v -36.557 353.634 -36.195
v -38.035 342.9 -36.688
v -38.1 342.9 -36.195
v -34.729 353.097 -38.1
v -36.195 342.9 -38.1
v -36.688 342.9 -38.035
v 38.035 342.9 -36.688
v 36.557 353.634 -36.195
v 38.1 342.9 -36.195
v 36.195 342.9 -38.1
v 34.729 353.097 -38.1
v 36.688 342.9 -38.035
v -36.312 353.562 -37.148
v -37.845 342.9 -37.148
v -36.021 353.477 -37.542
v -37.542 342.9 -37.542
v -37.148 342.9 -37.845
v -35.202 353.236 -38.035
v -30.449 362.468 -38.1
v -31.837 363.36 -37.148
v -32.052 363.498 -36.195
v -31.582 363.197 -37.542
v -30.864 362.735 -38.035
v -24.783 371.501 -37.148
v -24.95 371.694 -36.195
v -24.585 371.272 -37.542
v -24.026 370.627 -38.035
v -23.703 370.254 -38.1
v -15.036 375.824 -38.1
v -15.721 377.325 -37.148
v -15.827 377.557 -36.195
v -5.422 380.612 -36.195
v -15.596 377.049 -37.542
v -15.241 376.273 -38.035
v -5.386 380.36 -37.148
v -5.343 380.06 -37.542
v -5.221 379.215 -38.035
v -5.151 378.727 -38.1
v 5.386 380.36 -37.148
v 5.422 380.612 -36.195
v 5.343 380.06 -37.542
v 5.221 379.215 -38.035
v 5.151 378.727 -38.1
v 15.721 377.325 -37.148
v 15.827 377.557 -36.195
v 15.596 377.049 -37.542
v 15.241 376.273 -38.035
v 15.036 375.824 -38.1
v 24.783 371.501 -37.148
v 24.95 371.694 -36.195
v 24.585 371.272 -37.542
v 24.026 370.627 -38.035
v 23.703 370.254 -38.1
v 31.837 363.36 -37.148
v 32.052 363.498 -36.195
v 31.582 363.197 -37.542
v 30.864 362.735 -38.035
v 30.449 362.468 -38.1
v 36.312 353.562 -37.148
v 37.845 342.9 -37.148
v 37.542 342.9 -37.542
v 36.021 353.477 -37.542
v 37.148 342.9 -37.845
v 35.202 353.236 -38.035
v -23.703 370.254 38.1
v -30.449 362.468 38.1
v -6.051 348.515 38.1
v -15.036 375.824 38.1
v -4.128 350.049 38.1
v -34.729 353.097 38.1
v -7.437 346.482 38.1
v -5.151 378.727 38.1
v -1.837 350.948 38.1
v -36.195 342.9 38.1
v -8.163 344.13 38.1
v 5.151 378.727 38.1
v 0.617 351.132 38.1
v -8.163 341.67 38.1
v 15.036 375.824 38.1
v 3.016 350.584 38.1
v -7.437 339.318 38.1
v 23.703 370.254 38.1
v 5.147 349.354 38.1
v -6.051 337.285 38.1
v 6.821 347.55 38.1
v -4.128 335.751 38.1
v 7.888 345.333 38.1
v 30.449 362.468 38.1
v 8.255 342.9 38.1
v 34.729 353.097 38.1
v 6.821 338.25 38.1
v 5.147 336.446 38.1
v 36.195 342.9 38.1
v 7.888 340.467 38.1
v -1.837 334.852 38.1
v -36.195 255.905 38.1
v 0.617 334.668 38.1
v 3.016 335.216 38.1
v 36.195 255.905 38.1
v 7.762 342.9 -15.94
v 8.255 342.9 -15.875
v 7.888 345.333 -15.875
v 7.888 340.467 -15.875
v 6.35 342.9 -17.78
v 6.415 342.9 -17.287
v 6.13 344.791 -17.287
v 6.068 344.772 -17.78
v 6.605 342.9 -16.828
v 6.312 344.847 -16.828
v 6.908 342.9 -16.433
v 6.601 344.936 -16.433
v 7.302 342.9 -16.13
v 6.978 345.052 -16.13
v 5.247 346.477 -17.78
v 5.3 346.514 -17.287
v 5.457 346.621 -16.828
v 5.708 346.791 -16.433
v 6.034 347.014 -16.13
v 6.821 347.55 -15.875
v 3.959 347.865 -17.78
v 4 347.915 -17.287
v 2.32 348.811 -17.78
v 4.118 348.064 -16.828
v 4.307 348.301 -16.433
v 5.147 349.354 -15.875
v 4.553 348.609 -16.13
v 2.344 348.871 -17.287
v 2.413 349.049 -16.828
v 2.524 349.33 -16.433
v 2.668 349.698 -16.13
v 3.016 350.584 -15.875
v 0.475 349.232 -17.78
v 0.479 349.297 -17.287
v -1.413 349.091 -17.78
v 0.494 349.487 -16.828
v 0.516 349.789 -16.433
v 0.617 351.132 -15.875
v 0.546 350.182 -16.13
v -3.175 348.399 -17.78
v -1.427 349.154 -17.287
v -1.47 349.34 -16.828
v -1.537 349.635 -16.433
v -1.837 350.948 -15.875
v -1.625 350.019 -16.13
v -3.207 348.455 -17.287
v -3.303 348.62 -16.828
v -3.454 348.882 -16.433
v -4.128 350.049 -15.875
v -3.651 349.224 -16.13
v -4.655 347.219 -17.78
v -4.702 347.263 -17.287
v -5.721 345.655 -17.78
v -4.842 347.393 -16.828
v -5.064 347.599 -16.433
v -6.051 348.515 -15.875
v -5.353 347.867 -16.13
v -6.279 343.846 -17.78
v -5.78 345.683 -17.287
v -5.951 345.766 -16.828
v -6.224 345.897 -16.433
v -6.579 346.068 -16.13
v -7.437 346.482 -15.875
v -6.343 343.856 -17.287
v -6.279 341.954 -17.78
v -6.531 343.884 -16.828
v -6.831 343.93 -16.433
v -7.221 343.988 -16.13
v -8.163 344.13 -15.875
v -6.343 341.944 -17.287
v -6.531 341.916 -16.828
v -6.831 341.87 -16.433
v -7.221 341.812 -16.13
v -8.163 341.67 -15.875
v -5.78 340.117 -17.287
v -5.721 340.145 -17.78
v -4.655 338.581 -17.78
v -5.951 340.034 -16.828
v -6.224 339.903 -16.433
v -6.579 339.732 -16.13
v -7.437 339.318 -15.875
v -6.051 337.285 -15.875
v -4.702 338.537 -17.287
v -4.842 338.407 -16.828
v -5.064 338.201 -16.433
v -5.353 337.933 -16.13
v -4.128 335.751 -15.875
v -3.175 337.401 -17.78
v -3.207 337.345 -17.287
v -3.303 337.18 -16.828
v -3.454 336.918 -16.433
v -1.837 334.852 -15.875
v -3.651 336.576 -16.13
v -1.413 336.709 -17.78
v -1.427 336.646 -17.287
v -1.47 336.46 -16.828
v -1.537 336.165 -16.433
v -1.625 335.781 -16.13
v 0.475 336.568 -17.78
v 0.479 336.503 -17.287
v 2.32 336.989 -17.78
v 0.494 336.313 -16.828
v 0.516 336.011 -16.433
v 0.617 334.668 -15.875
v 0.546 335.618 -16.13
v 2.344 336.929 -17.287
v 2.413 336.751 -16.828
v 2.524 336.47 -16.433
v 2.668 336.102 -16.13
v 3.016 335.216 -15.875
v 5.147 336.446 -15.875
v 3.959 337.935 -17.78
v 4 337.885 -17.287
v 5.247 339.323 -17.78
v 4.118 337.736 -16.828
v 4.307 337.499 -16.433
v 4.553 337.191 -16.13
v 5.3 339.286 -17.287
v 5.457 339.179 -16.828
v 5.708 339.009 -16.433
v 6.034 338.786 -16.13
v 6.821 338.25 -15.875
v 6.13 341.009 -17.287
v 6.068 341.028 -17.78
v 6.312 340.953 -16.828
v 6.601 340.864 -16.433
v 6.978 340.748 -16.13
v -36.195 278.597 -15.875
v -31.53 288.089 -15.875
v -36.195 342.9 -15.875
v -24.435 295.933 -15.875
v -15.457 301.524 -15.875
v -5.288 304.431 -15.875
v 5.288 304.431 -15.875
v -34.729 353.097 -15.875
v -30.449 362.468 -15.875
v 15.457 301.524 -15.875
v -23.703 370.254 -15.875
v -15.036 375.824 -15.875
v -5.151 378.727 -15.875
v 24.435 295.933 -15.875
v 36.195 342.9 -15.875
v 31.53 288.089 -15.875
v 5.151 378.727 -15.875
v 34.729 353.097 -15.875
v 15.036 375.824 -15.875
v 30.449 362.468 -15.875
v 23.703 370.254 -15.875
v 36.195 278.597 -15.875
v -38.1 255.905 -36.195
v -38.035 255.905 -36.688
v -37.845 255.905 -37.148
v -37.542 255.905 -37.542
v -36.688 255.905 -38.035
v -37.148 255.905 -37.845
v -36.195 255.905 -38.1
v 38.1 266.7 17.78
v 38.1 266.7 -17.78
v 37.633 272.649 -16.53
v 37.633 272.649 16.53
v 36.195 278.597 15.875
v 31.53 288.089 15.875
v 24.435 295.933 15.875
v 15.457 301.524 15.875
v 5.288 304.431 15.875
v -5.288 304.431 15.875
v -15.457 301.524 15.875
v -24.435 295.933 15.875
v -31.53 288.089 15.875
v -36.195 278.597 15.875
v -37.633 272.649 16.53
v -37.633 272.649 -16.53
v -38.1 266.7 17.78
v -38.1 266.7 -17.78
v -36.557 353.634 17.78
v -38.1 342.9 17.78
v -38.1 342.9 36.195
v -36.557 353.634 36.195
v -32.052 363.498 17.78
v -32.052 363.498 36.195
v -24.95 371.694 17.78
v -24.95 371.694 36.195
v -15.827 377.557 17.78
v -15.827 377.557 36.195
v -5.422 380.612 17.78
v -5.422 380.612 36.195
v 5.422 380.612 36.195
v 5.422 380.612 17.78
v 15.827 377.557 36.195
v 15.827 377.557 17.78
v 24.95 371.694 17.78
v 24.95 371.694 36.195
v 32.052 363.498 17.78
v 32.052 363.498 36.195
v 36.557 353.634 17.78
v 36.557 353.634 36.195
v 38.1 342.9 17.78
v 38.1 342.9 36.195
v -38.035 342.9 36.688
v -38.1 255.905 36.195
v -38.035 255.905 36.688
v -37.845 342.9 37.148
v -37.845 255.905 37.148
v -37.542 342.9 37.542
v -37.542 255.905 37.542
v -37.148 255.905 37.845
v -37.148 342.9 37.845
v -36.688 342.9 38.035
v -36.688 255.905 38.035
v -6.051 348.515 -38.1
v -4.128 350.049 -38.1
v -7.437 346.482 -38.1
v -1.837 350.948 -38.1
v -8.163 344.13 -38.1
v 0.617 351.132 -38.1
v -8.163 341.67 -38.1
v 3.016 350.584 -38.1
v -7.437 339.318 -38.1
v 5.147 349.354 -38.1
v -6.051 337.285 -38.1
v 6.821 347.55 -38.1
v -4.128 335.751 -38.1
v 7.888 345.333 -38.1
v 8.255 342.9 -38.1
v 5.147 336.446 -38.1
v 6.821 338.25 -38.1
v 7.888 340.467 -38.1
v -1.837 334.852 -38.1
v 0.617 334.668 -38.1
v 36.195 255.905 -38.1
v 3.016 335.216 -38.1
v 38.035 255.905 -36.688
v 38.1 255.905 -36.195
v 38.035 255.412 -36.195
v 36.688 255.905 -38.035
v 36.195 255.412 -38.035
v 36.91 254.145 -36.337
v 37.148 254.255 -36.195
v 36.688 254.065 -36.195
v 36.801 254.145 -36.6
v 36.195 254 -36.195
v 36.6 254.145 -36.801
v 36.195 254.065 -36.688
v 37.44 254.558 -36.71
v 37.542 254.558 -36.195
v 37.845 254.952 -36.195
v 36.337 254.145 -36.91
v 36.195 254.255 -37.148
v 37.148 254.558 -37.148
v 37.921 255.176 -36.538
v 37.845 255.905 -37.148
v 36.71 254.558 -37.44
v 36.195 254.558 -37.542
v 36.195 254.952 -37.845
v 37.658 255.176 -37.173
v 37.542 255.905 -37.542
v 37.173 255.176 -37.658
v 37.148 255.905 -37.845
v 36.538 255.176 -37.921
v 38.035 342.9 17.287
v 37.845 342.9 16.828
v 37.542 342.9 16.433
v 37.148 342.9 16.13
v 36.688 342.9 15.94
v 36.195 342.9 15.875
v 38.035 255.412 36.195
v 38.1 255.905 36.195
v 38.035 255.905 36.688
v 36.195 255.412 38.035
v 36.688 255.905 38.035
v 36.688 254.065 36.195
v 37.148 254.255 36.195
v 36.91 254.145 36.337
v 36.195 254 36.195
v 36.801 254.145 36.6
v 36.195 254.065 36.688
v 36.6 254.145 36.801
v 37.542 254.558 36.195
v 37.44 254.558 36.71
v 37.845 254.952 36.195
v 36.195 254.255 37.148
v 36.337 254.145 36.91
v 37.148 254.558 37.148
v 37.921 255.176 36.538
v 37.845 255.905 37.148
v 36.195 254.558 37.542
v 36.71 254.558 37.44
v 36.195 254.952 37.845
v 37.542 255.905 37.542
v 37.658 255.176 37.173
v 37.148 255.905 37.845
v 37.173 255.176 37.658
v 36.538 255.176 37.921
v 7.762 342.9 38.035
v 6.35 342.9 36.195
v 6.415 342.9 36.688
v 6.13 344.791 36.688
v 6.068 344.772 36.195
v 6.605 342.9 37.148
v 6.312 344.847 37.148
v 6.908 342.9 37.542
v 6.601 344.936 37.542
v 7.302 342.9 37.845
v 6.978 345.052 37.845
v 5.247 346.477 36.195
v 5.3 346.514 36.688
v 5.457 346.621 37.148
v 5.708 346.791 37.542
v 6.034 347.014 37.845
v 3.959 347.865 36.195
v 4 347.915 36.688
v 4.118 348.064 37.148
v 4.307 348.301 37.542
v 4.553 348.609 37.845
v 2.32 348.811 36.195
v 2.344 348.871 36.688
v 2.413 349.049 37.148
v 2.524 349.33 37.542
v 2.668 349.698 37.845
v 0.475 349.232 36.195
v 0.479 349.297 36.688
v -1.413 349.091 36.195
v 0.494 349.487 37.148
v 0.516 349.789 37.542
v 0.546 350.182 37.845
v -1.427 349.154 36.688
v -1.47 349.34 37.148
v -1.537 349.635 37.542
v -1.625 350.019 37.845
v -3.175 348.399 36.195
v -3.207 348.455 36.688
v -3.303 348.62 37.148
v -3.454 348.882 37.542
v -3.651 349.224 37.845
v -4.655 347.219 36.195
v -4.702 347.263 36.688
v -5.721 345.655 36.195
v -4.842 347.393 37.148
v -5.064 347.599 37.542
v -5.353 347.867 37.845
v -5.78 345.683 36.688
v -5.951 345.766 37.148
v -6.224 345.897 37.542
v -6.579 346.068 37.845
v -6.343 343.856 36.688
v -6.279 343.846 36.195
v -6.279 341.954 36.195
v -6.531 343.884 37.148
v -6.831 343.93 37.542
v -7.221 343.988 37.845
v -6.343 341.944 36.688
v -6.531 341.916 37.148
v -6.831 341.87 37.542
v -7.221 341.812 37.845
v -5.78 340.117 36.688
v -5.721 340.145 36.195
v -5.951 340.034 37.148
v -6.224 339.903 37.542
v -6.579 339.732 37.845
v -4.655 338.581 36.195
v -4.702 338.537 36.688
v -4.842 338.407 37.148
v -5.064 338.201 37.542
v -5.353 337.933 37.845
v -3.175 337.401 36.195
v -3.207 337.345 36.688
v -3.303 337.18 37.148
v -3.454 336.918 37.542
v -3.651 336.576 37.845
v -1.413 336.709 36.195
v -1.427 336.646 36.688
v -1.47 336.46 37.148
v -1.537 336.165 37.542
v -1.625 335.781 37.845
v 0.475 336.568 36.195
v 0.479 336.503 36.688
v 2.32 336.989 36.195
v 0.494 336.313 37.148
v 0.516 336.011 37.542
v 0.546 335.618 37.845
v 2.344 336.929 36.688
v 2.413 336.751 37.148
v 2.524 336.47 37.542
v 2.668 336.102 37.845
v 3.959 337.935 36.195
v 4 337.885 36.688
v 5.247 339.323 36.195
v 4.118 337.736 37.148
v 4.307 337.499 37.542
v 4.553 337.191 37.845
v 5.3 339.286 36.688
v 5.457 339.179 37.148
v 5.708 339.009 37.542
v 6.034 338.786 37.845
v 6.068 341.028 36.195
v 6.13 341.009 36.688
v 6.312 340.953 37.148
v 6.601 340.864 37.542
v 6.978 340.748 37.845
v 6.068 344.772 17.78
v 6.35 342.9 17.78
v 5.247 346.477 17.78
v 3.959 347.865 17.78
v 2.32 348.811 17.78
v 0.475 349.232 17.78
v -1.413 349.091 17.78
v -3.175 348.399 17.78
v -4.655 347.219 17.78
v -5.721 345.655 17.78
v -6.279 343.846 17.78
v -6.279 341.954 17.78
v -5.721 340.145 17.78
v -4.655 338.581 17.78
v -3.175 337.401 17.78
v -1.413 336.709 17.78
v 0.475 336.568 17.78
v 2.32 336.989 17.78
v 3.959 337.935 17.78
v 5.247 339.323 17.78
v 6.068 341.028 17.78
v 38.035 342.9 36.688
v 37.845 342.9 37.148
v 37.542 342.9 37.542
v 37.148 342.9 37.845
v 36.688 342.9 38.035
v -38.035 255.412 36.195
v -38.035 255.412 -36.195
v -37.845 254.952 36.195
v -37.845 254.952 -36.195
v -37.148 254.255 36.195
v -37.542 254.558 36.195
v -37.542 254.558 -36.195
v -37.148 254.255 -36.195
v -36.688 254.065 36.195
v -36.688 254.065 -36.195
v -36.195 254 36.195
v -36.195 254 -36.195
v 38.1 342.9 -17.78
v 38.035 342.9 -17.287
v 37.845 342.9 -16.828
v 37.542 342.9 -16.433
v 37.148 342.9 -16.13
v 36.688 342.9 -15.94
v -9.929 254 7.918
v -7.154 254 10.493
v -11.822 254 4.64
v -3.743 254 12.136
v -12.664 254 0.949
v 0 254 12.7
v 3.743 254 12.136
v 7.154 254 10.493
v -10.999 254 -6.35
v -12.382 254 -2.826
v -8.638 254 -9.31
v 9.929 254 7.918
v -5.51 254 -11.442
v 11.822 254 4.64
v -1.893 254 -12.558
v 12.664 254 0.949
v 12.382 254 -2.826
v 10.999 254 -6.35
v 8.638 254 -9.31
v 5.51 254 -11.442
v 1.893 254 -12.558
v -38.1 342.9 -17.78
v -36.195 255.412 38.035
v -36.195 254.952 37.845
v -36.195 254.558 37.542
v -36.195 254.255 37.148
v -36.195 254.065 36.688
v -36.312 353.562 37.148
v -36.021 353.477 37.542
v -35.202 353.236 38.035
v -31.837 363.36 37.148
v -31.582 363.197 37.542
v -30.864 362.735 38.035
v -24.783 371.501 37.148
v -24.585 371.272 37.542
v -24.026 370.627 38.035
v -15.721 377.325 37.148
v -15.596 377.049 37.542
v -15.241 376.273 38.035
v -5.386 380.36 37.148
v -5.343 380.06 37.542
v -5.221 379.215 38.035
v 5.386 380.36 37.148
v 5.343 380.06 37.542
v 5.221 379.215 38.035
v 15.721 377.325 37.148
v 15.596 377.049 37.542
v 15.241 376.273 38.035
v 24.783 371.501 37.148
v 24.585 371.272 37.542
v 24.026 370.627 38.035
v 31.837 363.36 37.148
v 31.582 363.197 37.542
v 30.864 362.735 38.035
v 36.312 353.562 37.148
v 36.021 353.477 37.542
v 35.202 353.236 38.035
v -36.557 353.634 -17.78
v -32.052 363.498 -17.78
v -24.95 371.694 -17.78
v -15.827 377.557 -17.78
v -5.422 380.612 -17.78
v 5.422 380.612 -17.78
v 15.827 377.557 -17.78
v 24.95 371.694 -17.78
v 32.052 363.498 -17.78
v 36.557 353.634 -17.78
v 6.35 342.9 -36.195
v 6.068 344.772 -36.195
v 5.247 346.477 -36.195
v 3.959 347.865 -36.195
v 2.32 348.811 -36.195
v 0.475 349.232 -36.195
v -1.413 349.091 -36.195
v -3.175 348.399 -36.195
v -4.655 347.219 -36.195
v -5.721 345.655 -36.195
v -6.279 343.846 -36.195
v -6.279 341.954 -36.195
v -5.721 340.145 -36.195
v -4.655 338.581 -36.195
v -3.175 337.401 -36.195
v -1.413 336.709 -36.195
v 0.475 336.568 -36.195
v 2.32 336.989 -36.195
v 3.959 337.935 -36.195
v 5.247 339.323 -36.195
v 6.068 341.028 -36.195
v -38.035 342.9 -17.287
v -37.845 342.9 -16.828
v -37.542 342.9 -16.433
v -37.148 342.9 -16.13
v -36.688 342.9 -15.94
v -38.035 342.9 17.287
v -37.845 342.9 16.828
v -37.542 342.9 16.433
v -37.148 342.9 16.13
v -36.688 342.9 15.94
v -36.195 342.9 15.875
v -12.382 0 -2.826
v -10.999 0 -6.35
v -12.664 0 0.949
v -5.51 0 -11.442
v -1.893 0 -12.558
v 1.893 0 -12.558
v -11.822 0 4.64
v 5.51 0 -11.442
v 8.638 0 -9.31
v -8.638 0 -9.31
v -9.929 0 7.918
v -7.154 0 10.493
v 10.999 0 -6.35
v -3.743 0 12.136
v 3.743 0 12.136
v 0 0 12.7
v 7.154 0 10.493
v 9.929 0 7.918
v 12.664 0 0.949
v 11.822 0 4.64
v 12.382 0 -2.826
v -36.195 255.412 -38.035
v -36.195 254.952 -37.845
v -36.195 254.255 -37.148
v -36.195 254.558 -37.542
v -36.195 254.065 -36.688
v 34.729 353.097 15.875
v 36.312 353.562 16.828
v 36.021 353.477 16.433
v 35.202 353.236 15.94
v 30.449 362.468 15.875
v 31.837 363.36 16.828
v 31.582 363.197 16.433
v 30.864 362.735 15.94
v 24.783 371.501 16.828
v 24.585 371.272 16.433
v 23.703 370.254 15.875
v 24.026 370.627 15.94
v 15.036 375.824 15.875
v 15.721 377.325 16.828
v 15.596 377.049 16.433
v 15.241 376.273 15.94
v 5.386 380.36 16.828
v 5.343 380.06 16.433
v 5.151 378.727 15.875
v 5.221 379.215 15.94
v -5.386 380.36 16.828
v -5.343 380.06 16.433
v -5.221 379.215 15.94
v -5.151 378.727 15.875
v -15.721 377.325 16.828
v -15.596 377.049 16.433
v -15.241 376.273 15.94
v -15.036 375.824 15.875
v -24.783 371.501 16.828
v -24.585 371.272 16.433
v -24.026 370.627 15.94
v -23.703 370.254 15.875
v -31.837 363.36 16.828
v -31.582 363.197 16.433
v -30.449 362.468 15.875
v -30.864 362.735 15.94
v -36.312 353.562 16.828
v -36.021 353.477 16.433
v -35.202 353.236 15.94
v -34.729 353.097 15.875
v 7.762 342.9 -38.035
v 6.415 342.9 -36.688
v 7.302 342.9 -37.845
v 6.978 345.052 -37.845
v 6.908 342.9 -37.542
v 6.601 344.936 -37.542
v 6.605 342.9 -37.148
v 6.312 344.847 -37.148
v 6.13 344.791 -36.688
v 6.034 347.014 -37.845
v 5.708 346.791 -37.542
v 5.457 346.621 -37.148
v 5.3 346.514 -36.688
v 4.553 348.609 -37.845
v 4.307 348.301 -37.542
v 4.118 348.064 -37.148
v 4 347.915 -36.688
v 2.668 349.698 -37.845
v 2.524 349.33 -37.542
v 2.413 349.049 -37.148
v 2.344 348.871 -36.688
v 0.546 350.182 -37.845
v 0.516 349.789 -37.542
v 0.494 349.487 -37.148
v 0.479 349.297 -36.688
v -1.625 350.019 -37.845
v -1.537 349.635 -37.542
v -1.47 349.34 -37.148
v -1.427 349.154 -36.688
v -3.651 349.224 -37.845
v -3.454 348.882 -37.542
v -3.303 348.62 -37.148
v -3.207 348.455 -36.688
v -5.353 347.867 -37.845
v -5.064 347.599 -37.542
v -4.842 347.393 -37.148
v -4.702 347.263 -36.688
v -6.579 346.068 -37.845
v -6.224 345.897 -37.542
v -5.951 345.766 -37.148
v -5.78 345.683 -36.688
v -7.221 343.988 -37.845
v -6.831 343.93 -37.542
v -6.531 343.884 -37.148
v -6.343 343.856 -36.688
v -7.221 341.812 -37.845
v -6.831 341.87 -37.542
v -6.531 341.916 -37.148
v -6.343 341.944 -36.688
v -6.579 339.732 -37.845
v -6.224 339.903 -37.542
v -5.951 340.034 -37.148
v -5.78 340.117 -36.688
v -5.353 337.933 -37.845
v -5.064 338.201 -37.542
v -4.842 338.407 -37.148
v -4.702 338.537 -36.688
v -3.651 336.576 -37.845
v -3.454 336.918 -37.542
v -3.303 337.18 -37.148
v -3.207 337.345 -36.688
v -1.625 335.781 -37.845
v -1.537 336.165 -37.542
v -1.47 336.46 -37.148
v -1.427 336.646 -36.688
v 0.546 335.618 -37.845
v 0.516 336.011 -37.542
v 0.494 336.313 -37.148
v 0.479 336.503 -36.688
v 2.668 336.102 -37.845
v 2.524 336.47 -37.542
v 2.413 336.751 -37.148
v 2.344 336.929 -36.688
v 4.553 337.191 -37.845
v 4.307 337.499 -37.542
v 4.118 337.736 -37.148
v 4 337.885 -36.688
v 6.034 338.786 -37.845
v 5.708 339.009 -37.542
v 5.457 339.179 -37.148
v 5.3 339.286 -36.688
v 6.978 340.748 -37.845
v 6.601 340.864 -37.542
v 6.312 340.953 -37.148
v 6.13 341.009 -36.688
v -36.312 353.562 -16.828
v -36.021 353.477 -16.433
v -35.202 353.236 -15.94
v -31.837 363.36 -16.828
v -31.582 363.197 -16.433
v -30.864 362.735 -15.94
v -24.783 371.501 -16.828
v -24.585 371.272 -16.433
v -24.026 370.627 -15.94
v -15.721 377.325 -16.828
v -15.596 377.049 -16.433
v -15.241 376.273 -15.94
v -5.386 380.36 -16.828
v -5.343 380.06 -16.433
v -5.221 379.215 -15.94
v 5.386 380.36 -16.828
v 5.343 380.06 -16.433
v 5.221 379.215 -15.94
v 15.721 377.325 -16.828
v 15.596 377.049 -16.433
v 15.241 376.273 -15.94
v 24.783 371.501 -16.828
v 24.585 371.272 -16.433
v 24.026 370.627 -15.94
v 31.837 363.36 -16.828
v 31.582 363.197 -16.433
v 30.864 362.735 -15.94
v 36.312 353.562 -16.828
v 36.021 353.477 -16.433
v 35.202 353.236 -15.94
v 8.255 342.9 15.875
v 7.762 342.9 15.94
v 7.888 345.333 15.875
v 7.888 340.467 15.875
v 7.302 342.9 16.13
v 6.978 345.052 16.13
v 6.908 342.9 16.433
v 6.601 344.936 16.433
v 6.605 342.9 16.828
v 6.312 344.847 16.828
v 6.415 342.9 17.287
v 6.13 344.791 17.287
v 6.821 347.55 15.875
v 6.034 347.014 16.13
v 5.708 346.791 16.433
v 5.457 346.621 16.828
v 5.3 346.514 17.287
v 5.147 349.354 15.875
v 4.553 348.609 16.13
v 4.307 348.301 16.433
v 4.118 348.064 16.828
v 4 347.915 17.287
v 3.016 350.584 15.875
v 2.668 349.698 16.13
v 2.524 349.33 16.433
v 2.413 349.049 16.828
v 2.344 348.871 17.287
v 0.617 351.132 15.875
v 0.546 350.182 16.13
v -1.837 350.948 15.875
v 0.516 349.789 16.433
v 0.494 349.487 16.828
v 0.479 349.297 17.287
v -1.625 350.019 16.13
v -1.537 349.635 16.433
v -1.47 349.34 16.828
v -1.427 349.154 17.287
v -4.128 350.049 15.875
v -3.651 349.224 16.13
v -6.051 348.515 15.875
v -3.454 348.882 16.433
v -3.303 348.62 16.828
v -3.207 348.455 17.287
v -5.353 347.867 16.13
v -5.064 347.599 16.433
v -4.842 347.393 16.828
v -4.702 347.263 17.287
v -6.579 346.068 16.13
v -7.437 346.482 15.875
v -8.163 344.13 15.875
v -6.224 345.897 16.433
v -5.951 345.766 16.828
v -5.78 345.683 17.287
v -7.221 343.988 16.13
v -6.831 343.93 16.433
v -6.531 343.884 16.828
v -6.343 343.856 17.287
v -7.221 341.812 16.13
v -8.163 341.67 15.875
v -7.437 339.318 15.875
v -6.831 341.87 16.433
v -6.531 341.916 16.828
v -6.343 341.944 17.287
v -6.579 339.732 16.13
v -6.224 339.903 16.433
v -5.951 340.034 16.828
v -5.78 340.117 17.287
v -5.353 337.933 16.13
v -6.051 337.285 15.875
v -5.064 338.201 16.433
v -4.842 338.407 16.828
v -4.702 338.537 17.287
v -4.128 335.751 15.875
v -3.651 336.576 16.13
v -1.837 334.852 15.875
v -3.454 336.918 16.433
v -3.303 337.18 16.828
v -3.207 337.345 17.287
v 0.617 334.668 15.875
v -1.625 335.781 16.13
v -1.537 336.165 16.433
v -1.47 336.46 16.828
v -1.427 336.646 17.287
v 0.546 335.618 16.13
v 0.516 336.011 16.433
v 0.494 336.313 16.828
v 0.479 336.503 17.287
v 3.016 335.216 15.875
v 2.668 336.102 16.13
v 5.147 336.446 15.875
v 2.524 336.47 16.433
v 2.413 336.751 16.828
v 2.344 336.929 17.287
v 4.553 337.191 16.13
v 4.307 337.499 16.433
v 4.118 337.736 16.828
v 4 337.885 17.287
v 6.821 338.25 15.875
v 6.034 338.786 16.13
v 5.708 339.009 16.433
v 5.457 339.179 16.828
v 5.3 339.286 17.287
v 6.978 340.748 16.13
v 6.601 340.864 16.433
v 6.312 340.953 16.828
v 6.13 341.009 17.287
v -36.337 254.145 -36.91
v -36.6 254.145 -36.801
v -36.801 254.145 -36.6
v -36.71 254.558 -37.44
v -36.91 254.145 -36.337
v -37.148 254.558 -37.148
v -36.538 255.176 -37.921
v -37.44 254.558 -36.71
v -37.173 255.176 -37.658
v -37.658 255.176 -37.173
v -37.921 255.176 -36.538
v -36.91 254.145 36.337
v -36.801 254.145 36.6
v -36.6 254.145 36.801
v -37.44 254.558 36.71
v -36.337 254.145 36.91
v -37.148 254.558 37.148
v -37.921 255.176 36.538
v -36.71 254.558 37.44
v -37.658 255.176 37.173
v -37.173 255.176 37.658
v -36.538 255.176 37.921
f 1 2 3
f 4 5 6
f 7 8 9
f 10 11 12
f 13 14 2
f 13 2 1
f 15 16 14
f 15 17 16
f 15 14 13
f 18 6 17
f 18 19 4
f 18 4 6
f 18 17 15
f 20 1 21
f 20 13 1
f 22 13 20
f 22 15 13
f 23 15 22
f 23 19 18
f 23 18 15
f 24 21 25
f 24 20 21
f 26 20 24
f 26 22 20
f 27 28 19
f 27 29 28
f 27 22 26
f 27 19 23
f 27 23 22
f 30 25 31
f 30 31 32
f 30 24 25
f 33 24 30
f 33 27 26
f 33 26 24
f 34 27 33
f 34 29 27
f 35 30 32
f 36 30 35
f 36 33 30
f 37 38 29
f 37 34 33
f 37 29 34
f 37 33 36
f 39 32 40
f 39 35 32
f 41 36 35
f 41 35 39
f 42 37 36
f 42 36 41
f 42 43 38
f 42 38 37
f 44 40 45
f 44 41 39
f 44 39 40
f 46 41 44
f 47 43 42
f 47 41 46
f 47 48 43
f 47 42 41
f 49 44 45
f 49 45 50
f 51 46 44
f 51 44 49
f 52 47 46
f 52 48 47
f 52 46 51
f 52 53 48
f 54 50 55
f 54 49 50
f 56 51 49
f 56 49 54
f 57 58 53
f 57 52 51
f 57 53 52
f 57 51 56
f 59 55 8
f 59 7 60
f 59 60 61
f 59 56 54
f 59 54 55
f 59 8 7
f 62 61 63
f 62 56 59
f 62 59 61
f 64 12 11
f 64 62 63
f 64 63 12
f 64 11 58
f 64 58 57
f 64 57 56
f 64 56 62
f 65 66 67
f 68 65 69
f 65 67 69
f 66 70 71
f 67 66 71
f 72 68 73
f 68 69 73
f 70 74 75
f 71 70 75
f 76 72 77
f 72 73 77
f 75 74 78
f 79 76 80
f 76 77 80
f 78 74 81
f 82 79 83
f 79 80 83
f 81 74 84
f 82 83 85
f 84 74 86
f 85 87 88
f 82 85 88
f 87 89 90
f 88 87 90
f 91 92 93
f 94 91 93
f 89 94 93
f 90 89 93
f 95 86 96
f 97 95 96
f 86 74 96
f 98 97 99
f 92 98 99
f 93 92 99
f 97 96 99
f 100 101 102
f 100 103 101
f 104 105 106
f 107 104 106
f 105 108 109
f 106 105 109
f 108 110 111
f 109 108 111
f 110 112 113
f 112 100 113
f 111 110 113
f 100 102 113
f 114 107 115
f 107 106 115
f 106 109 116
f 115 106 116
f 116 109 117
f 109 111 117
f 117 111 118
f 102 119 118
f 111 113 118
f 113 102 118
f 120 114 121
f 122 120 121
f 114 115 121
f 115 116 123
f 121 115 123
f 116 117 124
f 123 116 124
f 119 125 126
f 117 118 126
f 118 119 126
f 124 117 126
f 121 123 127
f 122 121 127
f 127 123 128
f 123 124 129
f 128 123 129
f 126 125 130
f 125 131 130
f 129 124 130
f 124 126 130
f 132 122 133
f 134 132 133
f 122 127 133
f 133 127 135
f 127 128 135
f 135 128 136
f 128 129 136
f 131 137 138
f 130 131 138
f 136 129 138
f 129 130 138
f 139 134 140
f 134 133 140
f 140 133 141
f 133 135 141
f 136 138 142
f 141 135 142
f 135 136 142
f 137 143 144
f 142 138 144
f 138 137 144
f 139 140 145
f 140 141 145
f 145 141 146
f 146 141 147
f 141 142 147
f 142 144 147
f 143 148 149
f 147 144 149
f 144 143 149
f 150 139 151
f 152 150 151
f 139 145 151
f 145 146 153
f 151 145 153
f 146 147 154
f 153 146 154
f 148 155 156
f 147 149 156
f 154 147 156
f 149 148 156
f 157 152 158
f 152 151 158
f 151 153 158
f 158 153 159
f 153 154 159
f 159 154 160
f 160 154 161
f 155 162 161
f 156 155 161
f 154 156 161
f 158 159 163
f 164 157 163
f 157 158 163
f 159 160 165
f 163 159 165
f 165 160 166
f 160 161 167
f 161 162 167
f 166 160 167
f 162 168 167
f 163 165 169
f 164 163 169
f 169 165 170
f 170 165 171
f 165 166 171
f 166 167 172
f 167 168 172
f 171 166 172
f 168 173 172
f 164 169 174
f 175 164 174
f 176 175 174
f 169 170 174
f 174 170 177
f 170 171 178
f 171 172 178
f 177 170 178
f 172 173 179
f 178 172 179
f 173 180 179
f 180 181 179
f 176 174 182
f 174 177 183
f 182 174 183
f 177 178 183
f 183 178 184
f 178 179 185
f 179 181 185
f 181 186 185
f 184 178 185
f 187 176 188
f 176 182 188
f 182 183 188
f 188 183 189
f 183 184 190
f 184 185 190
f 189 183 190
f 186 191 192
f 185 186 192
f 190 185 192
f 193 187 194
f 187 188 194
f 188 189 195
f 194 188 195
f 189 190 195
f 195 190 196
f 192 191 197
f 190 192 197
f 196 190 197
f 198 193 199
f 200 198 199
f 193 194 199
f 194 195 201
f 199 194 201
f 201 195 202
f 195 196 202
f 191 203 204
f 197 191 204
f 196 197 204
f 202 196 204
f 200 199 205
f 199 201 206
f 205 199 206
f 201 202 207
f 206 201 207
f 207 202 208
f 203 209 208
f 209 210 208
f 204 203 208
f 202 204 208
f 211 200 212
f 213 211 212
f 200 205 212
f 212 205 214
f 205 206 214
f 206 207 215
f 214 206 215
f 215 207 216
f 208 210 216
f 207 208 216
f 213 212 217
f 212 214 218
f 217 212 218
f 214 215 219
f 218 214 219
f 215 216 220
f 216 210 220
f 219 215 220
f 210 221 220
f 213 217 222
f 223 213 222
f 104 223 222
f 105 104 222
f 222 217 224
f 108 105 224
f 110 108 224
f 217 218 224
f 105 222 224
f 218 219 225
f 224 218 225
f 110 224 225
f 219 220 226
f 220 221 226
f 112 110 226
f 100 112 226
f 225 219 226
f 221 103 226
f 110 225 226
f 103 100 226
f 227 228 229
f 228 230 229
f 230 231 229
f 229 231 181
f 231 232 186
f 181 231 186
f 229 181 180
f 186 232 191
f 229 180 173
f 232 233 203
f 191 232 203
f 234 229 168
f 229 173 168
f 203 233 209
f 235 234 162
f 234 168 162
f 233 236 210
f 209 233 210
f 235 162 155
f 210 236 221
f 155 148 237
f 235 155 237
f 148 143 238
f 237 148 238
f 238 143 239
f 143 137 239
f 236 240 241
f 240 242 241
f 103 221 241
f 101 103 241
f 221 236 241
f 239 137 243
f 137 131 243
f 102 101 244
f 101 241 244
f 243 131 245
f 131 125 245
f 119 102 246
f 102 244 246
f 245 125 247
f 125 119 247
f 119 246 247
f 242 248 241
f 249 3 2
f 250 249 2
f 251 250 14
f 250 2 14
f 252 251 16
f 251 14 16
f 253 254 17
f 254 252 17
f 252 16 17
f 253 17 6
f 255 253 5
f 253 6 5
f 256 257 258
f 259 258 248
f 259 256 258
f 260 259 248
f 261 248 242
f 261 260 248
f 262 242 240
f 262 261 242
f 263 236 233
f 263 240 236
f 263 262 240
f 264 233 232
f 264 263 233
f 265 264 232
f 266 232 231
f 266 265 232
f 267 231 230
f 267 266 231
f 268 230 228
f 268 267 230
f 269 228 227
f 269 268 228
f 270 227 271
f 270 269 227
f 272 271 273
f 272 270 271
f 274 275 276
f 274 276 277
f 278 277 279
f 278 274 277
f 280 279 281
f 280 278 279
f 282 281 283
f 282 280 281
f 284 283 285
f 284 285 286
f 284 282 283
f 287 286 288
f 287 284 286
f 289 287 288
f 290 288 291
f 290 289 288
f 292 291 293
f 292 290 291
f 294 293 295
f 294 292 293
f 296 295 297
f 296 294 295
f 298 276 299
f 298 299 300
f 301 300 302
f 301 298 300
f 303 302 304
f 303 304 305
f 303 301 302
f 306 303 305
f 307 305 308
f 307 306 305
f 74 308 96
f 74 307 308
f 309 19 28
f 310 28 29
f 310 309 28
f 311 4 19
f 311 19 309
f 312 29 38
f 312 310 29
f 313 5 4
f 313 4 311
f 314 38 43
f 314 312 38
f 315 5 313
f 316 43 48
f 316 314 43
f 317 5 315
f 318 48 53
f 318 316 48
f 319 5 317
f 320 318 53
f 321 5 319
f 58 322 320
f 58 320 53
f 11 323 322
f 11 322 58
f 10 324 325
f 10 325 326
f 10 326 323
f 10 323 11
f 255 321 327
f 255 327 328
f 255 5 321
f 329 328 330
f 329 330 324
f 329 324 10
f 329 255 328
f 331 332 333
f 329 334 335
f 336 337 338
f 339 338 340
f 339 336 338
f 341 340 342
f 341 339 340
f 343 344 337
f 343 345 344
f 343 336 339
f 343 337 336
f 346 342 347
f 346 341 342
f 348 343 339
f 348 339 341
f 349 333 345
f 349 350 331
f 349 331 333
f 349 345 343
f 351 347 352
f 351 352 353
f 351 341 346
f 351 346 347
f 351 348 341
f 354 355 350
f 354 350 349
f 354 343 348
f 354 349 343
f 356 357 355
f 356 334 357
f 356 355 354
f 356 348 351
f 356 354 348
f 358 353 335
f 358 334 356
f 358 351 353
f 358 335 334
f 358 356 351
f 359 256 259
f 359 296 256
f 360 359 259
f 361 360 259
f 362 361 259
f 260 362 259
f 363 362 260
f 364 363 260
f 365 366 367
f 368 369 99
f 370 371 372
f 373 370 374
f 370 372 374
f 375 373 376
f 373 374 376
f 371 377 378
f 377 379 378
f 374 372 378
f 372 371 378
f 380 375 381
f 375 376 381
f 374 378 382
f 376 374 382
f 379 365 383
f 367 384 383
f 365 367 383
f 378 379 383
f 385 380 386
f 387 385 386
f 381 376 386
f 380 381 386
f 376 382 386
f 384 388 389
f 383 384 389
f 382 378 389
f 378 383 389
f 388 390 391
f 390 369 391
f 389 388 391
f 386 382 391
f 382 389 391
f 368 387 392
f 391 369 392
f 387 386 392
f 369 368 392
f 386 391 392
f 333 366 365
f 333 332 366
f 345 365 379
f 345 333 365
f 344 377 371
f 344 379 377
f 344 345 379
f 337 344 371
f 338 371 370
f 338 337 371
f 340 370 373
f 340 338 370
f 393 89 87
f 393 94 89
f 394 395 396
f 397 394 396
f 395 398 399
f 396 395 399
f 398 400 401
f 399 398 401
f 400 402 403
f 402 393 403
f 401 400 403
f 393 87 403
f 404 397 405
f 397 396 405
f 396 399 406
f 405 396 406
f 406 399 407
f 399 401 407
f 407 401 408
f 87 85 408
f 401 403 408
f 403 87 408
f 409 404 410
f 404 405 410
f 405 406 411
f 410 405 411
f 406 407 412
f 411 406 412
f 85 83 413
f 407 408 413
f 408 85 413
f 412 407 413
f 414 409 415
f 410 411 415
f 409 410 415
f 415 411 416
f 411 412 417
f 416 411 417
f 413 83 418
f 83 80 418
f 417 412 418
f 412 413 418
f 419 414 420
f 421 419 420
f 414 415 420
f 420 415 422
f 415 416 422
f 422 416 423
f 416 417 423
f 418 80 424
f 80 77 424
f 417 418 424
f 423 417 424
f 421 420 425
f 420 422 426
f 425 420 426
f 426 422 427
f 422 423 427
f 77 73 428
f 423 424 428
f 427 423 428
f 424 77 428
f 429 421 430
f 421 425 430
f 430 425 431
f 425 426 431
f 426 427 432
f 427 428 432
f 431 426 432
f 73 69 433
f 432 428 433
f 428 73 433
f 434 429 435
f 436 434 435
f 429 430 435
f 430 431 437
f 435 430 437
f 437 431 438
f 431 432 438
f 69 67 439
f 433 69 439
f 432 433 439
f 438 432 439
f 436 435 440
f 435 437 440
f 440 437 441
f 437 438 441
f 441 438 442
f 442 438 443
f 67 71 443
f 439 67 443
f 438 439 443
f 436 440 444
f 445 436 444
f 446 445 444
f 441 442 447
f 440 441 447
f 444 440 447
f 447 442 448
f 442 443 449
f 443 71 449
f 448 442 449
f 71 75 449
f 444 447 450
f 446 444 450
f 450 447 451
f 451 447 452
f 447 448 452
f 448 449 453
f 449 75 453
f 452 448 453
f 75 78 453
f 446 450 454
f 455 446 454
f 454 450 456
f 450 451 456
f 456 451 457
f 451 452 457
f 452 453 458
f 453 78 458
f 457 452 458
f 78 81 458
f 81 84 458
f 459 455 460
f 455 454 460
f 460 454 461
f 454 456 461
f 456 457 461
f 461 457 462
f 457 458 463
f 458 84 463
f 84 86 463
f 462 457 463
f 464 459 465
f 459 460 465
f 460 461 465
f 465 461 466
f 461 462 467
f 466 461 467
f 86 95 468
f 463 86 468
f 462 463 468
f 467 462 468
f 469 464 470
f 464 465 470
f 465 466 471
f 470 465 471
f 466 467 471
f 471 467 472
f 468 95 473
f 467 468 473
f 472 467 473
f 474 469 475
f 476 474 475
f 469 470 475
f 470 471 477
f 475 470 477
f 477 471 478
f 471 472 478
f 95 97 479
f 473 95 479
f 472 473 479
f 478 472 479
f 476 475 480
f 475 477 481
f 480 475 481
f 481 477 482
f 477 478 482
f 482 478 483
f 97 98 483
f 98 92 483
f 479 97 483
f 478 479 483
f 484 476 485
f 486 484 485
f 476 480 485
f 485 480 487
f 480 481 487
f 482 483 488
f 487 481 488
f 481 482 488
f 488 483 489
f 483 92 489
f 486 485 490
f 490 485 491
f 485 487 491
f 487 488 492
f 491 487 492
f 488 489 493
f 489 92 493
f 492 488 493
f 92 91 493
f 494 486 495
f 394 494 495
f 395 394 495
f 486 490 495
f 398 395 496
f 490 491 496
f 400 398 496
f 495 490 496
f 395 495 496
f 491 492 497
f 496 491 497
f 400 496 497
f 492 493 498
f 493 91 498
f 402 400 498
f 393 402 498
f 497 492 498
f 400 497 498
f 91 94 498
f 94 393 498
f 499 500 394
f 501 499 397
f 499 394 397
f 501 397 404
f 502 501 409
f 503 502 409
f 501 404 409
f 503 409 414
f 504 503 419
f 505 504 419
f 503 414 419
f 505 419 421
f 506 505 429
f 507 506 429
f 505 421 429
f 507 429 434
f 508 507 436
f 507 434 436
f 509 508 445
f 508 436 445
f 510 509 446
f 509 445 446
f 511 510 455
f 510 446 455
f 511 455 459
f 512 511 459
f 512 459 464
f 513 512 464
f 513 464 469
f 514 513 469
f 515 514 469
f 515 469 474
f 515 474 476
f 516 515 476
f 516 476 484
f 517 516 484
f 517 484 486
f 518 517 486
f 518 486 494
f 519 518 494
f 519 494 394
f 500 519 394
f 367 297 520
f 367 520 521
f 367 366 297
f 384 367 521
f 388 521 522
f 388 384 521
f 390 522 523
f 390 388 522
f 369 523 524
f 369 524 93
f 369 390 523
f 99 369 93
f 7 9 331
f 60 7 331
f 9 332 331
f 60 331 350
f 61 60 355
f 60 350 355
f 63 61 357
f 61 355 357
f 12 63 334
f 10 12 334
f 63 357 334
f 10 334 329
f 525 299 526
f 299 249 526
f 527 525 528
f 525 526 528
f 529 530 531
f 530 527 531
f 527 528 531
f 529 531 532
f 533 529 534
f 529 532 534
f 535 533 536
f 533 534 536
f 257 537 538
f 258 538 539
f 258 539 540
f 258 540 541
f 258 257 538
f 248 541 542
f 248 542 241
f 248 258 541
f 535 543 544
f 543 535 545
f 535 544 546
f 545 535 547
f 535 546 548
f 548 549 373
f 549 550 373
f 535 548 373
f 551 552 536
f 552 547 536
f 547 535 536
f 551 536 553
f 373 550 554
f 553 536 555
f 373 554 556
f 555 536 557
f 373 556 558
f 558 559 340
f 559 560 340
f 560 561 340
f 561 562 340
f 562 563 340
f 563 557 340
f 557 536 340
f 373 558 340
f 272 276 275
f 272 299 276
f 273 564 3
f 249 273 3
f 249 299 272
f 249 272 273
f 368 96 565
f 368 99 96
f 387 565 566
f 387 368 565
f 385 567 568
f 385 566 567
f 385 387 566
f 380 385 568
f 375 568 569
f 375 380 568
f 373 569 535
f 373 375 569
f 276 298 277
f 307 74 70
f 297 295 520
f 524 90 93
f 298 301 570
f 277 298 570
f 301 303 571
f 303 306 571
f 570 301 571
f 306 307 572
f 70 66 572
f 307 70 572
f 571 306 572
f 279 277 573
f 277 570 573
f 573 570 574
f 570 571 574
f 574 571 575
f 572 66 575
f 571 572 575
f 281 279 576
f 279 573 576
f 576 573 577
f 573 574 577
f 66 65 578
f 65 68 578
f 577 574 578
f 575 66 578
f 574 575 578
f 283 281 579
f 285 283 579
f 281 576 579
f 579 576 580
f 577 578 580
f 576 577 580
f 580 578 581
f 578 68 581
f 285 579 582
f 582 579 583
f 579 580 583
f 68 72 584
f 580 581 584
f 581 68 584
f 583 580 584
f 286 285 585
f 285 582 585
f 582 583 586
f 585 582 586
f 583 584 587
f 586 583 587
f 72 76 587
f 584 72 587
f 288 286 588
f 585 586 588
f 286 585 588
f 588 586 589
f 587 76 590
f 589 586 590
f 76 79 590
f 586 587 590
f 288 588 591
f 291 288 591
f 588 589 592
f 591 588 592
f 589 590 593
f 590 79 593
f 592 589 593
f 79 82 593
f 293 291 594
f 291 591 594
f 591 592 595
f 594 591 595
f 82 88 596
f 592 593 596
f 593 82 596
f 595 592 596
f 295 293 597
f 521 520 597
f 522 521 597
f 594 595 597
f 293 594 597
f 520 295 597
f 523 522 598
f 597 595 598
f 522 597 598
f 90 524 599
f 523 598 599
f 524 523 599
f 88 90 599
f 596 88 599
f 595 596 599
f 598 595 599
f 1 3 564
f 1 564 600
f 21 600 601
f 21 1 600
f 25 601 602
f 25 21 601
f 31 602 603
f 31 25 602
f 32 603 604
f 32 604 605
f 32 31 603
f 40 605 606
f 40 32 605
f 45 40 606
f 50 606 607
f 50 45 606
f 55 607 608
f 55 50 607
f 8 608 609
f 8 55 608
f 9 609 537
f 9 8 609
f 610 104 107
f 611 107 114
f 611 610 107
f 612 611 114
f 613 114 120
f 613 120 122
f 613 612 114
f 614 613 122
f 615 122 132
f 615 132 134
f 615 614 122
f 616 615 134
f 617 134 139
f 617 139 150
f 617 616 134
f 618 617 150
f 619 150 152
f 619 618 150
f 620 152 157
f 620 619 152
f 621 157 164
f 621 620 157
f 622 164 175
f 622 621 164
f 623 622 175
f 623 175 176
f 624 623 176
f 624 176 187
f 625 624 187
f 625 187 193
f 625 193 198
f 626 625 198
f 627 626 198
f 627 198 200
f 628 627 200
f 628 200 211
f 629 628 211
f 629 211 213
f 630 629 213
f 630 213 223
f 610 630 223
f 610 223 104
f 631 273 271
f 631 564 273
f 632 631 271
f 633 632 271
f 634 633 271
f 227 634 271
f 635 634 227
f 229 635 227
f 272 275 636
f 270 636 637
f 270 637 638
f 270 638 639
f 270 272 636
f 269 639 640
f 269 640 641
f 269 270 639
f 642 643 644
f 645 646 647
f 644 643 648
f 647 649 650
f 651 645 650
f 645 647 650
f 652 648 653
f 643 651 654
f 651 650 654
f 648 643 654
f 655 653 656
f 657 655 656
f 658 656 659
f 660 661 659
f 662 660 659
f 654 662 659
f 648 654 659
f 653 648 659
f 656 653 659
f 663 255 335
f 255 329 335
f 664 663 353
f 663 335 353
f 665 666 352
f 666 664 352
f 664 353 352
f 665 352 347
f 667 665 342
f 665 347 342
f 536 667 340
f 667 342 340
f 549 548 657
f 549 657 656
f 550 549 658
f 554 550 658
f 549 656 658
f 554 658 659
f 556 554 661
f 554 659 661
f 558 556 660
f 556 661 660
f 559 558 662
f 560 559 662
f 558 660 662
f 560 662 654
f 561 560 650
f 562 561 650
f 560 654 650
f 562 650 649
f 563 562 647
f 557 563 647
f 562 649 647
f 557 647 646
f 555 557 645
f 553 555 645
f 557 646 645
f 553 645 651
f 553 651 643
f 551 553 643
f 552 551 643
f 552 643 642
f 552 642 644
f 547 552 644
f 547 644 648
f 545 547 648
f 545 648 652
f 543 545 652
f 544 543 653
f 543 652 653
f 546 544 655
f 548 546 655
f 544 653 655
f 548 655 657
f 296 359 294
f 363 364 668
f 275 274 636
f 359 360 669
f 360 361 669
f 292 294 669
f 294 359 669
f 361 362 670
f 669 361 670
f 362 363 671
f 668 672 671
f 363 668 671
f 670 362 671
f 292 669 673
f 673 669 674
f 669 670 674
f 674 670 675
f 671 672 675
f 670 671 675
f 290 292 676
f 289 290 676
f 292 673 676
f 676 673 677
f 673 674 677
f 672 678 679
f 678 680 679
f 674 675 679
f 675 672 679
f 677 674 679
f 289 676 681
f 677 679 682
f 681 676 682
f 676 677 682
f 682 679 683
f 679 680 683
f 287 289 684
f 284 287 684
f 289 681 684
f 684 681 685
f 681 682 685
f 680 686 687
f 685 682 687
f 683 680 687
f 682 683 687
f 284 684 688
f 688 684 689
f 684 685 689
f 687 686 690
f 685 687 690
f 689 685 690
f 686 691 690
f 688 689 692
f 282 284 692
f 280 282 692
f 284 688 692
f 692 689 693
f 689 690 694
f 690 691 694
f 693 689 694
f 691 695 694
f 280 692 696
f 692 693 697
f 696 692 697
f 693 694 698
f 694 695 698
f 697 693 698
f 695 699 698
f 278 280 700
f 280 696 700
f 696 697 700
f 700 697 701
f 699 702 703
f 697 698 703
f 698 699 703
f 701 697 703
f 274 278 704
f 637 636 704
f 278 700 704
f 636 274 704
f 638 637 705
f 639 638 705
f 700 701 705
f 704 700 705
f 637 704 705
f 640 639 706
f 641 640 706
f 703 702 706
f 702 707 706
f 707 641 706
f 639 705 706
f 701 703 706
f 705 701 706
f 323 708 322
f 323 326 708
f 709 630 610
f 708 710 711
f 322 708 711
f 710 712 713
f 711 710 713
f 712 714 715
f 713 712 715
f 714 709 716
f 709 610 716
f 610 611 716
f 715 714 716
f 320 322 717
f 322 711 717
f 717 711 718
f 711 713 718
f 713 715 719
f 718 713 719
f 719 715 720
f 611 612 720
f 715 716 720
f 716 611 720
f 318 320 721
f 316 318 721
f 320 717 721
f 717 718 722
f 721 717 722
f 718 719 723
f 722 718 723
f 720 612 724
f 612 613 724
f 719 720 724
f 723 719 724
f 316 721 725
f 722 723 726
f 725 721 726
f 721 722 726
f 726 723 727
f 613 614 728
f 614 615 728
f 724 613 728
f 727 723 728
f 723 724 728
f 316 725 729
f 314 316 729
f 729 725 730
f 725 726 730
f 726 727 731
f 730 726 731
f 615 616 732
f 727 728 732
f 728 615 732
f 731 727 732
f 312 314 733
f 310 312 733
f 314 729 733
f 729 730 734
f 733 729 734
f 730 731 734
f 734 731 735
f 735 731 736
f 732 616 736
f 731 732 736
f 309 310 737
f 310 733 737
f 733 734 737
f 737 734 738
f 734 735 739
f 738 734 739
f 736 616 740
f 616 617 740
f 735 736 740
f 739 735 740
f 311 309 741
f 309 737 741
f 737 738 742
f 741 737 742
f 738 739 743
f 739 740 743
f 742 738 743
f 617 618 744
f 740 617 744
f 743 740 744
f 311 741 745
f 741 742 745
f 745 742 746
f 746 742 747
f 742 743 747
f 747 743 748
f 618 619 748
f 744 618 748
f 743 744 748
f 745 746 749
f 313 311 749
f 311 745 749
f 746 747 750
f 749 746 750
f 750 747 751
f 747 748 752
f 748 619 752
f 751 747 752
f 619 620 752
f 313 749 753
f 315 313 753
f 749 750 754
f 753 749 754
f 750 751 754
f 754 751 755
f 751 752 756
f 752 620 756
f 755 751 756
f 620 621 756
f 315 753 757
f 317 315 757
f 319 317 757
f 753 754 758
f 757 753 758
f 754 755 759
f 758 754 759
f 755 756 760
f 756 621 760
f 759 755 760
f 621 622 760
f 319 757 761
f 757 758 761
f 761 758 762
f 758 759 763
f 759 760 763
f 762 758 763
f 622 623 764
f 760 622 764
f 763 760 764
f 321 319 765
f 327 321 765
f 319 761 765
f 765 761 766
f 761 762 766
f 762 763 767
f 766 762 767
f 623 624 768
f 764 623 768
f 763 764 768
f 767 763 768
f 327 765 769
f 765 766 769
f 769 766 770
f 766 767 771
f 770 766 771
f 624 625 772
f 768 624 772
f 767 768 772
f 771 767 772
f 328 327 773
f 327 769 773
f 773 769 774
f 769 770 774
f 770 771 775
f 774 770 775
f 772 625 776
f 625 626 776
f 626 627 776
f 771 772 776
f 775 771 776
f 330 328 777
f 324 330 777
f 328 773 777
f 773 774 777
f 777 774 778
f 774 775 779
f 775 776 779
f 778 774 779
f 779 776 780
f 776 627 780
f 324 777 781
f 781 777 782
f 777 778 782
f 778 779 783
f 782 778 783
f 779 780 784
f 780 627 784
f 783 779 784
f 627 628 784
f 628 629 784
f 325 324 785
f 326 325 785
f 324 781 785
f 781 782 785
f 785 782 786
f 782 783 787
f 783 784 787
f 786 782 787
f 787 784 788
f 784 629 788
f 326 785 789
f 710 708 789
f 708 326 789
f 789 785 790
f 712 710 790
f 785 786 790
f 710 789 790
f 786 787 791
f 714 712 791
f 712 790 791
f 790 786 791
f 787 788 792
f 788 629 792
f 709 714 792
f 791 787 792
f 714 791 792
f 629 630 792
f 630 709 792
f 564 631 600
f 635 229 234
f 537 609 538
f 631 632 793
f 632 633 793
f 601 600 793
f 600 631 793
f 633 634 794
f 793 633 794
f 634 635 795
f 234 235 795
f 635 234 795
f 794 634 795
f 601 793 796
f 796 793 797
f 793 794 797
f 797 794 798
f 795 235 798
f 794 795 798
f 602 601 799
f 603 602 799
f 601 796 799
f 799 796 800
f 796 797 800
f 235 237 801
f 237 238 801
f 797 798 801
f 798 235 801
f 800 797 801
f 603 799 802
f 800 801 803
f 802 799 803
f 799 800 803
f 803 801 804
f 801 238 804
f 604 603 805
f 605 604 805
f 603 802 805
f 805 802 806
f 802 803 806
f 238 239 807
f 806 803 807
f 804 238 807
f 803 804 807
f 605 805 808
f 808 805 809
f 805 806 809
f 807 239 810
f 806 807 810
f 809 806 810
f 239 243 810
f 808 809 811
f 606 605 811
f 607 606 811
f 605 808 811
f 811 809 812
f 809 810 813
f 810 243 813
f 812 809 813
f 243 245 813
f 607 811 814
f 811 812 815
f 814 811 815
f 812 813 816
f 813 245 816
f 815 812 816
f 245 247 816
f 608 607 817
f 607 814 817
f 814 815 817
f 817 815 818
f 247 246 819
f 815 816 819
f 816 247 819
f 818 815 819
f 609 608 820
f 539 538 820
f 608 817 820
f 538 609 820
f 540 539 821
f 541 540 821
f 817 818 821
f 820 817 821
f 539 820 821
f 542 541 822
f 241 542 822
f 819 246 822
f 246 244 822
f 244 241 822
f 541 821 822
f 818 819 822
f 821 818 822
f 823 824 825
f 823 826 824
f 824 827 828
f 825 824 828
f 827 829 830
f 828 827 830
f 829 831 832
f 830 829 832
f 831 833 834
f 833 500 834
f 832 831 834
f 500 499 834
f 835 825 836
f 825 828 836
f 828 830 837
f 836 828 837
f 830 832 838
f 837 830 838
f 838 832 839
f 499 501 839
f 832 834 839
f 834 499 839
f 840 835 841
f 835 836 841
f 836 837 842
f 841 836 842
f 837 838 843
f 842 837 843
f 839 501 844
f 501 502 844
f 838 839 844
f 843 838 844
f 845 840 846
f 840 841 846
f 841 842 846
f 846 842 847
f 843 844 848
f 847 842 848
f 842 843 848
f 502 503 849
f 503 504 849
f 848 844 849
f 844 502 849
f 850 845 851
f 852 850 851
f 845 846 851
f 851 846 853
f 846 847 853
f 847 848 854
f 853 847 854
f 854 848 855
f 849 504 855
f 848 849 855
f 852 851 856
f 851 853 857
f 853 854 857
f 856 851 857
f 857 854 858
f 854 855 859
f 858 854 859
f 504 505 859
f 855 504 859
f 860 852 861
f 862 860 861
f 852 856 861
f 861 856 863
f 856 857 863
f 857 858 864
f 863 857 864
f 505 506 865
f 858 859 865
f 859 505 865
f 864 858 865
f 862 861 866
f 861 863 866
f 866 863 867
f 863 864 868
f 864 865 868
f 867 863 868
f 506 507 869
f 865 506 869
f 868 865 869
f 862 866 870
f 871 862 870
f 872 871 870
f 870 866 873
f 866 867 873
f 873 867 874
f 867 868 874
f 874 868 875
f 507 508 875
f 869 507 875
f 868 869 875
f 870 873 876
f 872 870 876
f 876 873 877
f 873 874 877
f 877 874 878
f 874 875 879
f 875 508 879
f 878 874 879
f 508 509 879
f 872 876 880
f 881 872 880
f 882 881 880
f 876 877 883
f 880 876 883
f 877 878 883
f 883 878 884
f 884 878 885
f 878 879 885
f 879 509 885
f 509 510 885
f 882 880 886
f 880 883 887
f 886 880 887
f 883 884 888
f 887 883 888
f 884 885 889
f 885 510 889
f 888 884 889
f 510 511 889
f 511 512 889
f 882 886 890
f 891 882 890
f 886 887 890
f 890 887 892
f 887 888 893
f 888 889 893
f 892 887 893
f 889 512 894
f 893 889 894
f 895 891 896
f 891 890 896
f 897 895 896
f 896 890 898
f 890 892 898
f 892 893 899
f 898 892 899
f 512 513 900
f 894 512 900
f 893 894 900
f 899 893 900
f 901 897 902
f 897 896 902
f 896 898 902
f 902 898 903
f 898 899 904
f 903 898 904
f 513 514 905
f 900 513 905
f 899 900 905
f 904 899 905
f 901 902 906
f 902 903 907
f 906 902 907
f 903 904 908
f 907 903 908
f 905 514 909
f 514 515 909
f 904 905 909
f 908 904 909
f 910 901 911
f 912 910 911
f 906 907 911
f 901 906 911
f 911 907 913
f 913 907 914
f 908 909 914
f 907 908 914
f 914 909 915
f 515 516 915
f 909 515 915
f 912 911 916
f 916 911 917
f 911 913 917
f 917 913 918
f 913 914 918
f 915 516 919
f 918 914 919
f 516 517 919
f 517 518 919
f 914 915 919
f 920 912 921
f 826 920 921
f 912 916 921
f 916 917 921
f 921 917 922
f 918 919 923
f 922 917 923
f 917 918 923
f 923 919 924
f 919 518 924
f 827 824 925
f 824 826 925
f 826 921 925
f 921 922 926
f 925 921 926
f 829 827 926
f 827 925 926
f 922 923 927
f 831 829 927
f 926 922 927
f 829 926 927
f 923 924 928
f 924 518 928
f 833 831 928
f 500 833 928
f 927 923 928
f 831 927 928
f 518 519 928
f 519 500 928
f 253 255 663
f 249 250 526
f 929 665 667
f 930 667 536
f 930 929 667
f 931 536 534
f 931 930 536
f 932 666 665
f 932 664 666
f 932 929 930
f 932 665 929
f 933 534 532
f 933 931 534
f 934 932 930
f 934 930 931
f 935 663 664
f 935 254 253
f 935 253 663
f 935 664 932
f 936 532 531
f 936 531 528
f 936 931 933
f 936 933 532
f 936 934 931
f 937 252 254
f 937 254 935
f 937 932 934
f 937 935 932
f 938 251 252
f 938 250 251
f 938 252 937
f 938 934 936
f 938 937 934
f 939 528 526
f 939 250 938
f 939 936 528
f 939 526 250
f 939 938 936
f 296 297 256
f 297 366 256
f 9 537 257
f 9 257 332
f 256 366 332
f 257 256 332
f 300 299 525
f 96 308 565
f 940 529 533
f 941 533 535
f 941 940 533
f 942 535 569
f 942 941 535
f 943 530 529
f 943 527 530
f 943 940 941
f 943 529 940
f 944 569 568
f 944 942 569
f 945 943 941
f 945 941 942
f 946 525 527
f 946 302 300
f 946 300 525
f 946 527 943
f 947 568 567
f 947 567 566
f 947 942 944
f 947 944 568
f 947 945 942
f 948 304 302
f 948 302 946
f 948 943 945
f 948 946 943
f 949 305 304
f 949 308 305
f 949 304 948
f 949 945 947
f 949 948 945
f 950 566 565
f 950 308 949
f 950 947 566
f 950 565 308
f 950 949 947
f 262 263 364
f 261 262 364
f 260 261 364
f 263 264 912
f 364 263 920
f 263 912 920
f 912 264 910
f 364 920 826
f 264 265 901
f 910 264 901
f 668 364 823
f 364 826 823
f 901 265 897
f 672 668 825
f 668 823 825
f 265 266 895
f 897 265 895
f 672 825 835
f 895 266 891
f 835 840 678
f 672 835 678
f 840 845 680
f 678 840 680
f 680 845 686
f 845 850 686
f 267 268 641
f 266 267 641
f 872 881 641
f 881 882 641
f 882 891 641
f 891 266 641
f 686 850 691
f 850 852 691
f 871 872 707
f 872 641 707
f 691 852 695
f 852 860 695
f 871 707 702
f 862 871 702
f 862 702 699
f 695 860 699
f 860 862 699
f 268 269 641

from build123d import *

# Parameters (mm, degrees)
SKETCH1_R           = 12.7
BOSS_EXTRUDE1_DEPTH = 254
SKETCH2_W           = 76.2
SKETCH2_H           = 76.2
BOSS_EXTRUDE2_DEPTH = 127
FILLET1_RADIUS      = 38.1
FILLET1_LENGTH      = 76.2
SKETCH3_W           = 31.75
SKETCH3_H           = 76.2
CUT_EXTRUDE1_DEPTH  = 38.1
HOLE1_REACH         = 392.409
HOLE1_BORE_R        = 6.35
FILLET2_RADIUS      = 38.1
FILLET2_LENGTH      = 31.75
FILLET3_R           = 1.905


with BuildPart() as part:
    # Sketch1 → Boss-Extrude1 (new body)
    with BuildSketch(Plane(origin=(0, 0, 0), x_dir=(1, 0, 0), z_dir=(0, 1, 0))):
        with Locations(Location((0, 0, 0), (0, 0, 270))):
            Circle(SKETCH1_R)
    extrude(amount=BOSS_EXTRUDE1_DEPTH)

    # Sketch2 → Boss-Extrude2 (add)
    with BuildSketch(Plane(origin=(0, 254, 0), x_dir=(1, 0, 0), z_dir=(0, 1, 0))):
        Rectangle(SKETCH2_W, SKETCH2_H)
    extrude(amount=BOSS_EXTRUDE2_DEPTH)

    # Fillet1: full round fillet: the end face becomes a half cylinder, R = half its width
    fillet1_face = Plane((0, 381, 0), x_dir=(0, 0, -1), z_dir=(0, 1, 0))  # on the end face: x along it, z out of the body
    fillet1_slab = fillet1_face.offset(-FILLET1_RADIUS / 2) * Box(FILLET1_LENGTH, 2 * FILLET1_RADIUS, FILLET1_RADIUS, mode=Mode.PRIVATE)  # the body's end, R deep
    fillet1_round = Plane((0, 342.9, 0), x_dir=(0, 1, 0), z_dir=(0, 0, -1)) * Cylinder(FILLET1_RADIUS, FILLET1_LENGTH, mode=Mode.PRIVATE)  # its axis R under the face
    add(fillet1_slab - fillet1_round, mode=Mode.SUBTRACT)

    # Sketch3 → Cut-Extrude1 (cut, symmetric)
    with BuildSketch(Plane(origin=(0, 0, 0), x_dir=(0, 0, -1), z_dir=(1, 0, 0))):
        with Locations((0, 342.9)):
            Rectangle(SKETCH3_W, SKETCH3_H)
    extrude(amount=CUT_EXTRUDE1_DEPTH, both=True, mode=Mode.SUBTRACT)

    # Hole1 bore → Hole1 (cut, up to next)
    with BuildSketch(Plane.XY.offset(38.1), mode=Mode.PRIVATE) as hole1_sk1:
        with Locations((0, 342.9)):
            Circle(HOLE1_BORE_R)
    hole1_tool1 = extrude(hole1_sk1.sketch, amount=-HOLE1_REACH, mode=Mode.PRIVATE) & part.part
    hole1 = hole1_tool1.solids().sort_by_distance((0, 342.9, 38.1))[0]
    add(hole1, mode=Mode.SUBTRACT)

    # Mirror1: Hole1 across plane
    add(hole1.mirror(Plane.XY), mode=Mode.SUBTRACT)

    # Fillet2: full round fillet: the end face becomes a half cylinder, R = half its width
    fillet2_face = Plane((0, 304.8, 0), x_dir=(0, 0, 1), z_dir=(0, 1, 0))  # on the end face: x along it, z out of the body
    fillet2_slab = fillet2_face.offset(-FILLET2_RADIUS / 2) * Box(FILLET2_LENGTH, 2 * FILLET2_RADIUS, FILLET2_RADIUS, mode=Mode.PRIVATE)  # the body's end, R deep
    fillet2_round = Plane((0, 266.7, 0), x_dir=(0, 1, 0), z_dir=(0, 0, 1)) * Cylinder(FILLET2_RADIUS, FILLET2_LENGTH, mode=Mode.PRIVATE)  # its axis R under the face
    add(fillet2_slab - fillet2_round, mode=Mode.SUBTRACT)

    # Fillet3
    fillet3_edges = [part.edges().sort_by_distance(p)[0] for p in [
        (-38.1, 298.45, 38.1),
        (-38.1, 298.45, -38.1),
        (38.1, 298.45, -38.1),
        (38.1, 298.45, 38.1),
        (0, 381, 38.1),
        (0, 381, -38.1),
        (-38.1, 304.8, 15.875),
        (0, 381, 15.875),
        (0, 381, -15.875),
        (-38.1, 304.8, -15.875),
        (38.1, 304.8, 15.875),
        (38.1, 304.8, -15.875),
        (-6.35, 342.9, 38.1),
        (-6.35, 342.9, 15.875),
        (-6.35, 342.9, -38.1),
        (-6.35, 342.9, -15.875),
        (38.1, 254, 0),
        (0, 254, -38.1),
        (-38.1, 254, 0),
        (0, 254, 38.1),
    ]]
    fillet(fillet3_edges, radius=FILLET3_R)


solid = part.part
